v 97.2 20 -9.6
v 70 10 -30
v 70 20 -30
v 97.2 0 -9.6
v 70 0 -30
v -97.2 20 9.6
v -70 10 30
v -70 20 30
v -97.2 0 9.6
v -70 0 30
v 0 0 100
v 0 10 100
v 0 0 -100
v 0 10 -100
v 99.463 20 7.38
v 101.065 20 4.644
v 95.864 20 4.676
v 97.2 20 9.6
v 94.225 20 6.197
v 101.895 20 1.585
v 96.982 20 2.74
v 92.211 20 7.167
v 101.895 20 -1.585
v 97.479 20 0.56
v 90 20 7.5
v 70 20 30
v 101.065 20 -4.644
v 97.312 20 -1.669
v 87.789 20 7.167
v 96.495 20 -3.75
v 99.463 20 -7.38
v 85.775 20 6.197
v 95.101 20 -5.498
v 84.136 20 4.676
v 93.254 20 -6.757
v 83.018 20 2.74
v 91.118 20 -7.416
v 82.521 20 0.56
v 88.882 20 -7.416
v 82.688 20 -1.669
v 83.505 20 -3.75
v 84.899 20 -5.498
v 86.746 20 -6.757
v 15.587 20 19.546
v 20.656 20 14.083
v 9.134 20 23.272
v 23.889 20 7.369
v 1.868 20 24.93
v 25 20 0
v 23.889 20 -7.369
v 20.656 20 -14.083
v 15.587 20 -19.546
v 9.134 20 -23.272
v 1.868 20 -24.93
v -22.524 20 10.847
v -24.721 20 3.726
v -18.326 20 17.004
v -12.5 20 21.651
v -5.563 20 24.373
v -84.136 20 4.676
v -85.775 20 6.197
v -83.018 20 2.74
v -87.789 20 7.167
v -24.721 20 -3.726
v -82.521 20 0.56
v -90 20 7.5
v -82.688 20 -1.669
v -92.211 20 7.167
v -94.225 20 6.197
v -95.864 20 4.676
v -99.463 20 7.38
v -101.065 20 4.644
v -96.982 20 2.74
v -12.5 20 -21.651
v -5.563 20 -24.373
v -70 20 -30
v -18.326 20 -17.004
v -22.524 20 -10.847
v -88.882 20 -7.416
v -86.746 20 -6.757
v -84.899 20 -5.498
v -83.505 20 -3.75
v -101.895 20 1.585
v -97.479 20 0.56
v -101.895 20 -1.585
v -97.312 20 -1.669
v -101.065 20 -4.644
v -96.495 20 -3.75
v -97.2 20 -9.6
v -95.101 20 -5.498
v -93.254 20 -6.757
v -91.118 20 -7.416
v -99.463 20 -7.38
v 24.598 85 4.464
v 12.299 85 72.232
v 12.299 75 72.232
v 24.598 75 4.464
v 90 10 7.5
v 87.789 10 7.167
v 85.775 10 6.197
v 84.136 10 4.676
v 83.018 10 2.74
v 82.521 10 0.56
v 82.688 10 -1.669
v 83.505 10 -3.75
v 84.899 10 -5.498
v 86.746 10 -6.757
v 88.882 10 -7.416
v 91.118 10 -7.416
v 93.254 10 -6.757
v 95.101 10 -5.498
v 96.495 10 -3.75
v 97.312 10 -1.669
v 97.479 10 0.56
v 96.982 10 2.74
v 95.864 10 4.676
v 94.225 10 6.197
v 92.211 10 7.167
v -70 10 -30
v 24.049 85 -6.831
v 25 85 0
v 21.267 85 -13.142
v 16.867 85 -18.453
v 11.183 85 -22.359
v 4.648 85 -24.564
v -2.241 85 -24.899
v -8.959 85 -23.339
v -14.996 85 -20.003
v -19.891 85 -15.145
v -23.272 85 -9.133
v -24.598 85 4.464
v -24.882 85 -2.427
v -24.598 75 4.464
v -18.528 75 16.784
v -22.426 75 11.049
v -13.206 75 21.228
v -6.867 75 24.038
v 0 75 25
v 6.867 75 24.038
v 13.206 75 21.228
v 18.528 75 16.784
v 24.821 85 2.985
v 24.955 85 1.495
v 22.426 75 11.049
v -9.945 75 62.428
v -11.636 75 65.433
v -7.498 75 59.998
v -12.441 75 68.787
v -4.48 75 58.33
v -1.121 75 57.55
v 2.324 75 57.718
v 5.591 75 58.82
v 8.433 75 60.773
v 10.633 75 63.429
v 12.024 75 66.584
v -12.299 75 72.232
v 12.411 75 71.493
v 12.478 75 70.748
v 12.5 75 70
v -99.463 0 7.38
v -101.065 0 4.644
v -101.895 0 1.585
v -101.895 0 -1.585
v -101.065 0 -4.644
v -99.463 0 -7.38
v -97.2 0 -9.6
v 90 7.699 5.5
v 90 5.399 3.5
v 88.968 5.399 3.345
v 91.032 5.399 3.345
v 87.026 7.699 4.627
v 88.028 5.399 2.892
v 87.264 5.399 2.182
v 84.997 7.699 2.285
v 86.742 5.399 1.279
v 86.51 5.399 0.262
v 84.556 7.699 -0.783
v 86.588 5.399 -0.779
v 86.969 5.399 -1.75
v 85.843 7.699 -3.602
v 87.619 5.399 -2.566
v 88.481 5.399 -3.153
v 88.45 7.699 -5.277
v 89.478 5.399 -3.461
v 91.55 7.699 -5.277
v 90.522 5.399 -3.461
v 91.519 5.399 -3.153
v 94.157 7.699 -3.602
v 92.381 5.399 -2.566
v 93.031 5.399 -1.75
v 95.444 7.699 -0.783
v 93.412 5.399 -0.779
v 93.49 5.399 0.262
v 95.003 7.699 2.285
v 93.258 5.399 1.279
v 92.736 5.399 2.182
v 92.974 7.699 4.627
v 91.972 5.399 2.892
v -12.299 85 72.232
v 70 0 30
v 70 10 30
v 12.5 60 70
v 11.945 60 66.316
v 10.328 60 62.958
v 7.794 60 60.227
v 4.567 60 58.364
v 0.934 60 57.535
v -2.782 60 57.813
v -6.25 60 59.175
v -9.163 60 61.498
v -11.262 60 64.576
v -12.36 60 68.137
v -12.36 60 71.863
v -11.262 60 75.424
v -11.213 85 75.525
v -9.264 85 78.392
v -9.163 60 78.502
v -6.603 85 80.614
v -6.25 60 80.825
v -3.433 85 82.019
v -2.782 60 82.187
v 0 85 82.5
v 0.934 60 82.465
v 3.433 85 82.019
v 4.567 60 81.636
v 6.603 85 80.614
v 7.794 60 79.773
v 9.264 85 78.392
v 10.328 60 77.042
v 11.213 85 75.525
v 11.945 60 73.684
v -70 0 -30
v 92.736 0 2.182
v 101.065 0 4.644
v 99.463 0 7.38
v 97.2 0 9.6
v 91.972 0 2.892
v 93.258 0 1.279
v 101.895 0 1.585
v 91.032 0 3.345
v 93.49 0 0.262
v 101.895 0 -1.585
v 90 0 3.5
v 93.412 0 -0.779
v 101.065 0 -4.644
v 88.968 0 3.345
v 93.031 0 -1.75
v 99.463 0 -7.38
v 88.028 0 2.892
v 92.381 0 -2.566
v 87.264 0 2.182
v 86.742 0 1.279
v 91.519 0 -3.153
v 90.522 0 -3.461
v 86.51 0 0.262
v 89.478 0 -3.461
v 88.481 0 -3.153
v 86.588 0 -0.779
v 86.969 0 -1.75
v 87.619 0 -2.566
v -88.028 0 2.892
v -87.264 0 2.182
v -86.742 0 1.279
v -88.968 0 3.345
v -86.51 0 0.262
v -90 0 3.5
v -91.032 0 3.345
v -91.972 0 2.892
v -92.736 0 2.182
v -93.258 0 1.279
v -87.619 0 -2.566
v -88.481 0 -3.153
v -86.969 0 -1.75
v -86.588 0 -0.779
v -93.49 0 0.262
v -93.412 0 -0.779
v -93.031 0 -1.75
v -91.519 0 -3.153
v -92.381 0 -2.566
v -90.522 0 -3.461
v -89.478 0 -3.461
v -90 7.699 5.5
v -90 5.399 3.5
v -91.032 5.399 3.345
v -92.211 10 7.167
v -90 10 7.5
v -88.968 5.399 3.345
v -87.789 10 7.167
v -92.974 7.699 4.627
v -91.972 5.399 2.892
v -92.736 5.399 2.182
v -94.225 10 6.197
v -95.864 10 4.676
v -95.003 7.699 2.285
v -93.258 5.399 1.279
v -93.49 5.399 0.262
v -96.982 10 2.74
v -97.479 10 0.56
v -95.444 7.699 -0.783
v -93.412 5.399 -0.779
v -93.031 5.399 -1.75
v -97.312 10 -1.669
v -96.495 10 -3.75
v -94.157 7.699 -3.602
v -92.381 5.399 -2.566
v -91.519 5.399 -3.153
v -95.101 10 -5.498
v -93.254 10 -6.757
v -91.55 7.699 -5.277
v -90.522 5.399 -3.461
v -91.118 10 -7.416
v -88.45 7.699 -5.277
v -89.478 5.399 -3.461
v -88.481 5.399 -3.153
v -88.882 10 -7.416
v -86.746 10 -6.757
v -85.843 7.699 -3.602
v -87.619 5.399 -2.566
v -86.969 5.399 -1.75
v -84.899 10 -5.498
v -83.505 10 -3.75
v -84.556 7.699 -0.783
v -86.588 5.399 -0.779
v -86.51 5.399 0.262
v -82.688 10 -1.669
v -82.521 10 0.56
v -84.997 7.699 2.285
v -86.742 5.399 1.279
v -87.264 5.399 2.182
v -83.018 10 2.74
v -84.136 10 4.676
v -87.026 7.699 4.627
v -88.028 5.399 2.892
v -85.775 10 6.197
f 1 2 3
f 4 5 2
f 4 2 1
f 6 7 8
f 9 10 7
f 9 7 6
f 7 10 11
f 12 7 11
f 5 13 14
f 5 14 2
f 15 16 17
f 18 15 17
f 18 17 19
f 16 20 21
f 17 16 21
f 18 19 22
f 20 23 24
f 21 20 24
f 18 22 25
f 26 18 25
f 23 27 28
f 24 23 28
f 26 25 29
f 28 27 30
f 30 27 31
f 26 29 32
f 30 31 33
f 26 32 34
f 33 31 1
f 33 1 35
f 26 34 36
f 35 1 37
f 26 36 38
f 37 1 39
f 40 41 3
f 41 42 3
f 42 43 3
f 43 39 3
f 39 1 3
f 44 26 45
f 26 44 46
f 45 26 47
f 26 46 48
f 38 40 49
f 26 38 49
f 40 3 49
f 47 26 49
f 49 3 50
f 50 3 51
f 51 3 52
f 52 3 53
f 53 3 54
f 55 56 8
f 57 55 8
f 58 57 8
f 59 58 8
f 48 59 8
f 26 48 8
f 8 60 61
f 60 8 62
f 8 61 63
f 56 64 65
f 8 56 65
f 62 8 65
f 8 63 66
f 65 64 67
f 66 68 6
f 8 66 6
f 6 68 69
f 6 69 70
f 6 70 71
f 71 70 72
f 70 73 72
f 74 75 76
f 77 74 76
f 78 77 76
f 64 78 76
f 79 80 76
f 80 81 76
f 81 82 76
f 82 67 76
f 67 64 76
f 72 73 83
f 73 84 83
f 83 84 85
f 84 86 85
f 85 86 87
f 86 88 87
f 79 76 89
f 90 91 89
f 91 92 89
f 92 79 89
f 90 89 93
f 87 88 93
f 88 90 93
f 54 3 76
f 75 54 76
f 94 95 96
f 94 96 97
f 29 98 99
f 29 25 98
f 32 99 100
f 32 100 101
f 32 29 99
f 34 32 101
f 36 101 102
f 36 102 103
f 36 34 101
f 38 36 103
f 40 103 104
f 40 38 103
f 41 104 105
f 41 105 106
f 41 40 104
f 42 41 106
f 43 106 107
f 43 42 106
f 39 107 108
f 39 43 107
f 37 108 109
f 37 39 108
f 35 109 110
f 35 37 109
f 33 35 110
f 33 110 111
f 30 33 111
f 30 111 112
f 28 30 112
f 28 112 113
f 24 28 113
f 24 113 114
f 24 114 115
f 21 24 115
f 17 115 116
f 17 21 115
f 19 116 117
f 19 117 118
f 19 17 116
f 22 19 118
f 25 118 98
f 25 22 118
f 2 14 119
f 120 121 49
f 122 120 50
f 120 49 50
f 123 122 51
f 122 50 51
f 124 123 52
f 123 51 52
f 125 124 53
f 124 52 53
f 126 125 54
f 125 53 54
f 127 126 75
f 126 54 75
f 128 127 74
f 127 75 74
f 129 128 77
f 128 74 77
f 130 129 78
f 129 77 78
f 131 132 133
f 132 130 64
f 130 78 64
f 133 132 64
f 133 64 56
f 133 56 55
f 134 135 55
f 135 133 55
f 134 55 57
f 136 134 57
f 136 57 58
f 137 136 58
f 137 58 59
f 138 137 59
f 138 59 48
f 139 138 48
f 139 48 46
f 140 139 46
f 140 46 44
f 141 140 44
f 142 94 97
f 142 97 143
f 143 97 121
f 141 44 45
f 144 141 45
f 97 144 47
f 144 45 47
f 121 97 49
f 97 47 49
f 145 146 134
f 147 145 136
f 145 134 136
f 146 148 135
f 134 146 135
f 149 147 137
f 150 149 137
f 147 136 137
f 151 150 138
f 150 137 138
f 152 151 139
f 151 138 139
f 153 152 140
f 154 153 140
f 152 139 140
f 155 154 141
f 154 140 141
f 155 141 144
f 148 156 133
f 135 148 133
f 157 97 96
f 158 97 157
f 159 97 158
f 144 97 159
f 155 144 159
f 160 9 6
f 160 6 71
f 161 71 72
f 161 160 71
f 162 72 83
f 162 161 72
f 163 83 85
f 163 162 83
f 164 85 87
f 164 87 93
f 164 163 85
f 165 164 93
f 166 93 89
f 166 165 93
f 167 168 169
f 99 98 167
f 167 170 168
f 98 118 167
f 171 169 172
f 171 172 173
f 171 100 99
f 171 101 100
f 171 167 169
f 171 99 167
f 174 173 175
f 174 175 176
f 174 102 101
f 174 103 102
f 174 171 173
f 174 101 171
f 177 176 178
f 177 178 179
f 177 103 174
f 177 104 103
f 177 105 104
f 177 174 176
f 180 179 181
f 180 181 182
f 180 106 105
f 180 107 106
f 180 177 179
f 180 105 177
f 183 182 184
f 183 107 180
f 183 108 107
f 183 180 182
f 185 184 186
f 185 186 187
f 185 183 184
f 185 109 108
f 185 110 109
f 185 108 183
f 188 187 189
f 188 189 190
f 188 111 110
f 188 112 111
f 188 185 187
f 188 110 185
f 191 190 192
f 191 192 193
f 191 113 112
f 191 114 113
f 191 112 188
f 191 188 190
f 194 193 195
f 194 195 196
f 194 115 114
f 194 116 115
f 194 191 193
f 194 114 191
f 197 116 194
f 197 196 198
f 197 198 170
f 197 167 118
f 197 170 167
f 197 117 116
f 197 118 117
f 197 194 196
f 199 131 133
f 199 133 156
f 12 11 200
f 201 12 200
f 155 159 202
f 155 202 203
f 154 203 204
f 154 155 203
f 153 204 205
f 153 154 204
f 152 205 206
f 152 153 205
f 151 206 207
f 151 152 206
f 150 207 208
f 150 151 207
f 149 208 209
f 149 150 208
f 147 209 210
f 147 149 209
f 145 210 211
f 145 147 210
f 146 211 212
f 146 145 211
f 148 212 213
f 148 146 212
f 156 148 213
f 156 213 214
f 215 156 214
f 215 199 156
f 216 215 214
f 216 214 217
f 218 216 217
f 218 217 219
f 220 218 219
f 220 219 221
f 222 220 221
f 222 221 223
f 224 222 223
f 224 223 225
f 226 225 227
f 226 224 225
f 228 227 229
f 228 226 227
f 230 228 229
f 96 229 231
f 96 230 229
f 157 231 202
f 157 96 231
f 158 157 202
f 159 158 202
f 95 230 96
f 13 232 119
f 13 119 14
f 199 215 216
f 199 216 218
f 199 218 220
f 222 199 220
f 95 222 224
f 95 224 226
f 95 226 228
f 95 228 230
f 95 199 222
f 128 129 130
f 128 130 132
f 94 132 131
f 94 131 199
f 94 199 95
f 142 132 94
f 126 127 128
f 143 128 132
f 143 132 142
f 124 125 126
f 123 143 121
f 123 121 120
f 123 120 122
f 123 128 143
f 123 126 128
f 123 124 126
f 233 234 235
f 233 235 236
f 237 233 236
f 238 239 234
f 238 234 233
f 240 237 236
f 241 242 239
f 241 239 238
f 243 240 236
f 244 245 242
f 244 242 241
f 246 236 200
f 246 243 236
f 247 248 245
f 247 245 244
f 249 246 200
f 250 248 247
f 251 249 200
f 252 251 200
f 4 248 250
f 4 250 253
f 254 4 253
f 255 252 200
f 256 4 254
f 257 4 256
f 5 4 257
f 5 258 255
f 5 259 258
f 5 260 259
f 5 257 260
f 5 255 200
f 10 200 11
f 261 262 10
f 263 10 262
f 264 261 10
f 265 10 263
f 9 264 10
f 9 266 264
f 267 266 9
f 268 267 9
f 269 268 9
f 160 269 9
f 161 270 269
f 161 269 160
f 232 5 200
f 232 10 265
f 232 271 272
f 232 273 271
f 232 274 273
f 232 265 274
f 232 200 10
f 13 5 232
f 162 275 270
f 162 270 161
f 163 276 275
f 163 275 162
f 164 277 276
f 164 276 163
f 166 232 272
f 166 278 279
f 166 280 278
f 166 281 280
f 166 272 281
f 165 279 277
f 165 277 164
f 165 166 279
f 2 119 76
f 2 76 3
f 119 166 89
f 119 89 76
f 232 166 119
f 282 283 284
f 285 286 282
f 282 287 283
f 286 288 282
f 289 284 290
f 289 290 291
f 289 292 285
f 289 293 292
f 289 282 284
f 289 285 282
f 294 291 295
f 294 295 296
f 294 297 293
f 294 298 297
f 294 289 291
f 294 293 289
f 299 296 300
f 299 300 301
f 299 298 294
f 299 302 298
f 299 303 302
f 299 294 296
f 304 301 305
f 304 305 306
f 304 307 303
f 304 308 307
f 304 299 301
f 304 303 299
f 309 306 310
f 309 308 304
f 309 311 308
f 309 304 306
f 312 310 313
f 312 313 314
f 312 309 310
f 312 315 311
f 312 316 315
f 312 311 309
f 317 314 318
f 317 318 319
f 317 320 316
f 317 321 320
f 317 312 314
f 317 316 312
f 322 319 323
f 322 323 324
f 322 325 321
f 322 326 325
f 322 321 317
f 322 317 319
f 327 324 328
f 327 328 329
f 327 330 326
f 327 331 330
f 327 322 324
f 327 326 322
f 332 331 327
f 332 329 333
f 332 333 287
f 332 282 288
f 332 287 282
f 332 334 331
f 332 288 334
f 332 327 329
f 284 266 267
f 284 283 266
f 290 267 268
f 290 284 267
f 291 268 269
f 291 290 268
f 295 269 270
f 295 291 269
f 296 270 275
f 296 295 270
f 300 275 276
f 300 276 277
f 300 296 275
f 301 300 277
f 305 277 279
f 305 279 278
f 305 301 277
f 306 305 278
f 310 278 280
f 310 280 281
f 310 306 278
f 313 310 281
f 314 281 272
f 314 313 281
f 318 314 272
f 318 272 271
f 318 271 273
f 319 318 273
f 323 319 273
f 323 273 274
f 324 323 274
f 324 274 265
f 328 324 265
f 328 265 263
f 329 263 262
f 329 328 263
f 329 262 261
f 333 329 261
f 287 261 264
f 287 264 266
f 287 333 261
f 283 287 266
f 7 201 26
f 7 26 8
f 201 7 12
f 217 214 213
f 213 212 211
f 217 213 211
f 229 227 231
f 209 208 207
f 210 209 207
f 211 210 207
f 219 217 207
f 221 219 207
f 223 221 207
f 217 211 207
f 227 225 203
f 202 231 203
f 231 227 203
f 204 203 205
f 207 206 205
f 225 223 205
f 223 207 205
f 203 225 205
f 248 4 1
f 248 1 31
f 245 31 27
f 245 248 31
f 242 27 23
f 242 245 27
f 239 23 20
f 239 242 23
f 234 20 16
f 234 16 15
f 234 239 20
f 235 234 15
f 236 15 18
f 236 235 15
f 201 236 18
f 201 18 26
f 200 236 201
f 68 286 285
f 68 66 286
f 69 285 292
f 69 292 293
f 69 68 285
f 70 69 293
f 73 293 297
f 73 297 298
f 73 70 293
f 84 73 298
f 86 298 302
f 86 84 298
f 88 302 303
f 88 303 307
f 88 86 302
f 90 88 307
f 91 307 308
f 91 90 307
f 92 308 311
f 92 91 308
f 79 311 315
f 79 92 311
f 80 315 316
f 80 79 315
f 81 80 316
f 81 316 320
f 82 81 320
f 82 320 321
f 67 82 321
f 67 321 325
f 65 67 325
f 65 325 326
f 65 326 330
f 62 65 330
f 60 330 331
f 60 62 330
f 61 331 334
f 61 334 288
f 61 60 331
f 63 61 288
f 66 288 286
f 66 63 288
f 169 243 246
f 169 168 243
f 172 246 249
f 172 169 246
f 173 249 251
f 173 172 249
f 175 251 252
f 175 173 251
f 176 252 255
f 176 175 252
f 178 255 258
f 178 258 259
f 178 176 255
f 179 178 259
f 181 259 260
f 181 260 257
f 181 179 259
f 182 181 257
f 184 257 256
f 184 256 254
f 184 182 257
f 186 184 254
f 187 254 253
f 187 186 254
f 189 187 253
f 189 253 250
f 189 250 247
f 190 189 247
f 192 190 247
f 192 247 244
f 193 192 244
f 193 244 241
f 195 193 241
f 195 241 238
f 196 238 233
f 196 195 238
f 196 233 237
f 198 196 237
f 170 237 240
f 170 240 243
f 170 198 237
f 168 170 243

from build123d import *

# Parameters (mm, degrees)
SALIENTE_EXTRUIR1_DEPTH                     = 10
SALIENTE_EXTRUIR1_2_DEPTH                   = 10
CROQUIS2_3_R                                = 25
SALIENTE_EXTRUIR2_DEPTH                     = 20
CROQUIS2_4_R                                = 25
SALIENTE_EXTRUIR3_DEPTH                     = 85
SALIENTE_EXTRUIR4_START                     = -10
SALIENTE_EXTRUIR4_DEPTH                     = 10
SALIENTE_EXTRUIR5_START                     = -25
SALIENTE_EXTRUIR5_DEPTH                     = 25
AVELLANADO_PARA_TORNILLO_CON_CABEZA_2_COUNT = 2
AVELLANADO_PARA_TORNILLO_CON_CABEZA_2_PITCH = 180


with BuildPart() as part:
    # Croquis2 → Saliente-Extruir1 (new body)
    with BuildSketch(Plane(origin=(0, 0, 0), x_dir=(1, 0, 0), z_dir=(0, 1, 0))):
        Polygon((0, 100), (-70, 30), (70, 30), align=None)
    extrude(amount=SALIENTE_EXTRUIR1_DEPTH)



with BuildPart() as body_2:
    # Croquis2 → Saliente-Extruir1 2 (new body)
    with BuildSketch(Plane(origin=(0, 0, 0), x_dir=(1, 0, 0), z_dir=(0, 1, 0))):
        Polygon((70, -30), (-70, -30), (0, -100), align=None)
    extrude(amount=SALIENTE_EXTRUIR1_2_DEPTH)


with BuildPart() as part_1:
    add(part.part)

    add(body_2.part)  # Saliente-Extruir2 merges body 2
    # Croquis2<3> → Saliente-Extruir2 (add)
    with BuildSketch(Plane(origin=(0, 0, 0), x_dir=(1, 0, 0), z_dir=(0, 1, 0))):
        with BuildLine():
            Line((-70, 30), (-97.2, 9.6))
            ThreePointArc((-97.2, 9.6), (-102, 0), (-97.2, -9.6))
            Line((-97.2, -9.6), (-70, -30))
            Line((-70, -30), (70, -30))
            Line((70, -30), (97.2, -9.6))
            ThreePointArc((97.2, -9.6), (102, 0), (97.2, 9.6))
            Line((97.2, 9.6), (70, 30))
            Line((70, 30), (-70, 30))
        make_face()
        Circle(CROQUIS2_3_R, mode=Mode.SUBTRACT)
    extrude(amount=SALIENTE_EXTRUIR2_DEPTH)

    # Croquis2<4> → Saliente-Extruir3 (add)
    with BuildSketch(Plane(origin=(0, 0, 0), x_dir=(1, 0, 0), z_dir=(0, 1, 0))):
        Circle(CROQUIS2_4_R)
    extrude(amount=SALIENTE_EXTRUIR3_DEPTH)

    # Croquis3 → Saliente-Extruir4 (add)
    with BuildSketch(Plane(origin=(0, 85, 0), x_dir=(1, 0, 0), z_dir=(0, 1, 0)).offset(SALIENTE_EXTRUIR4_START)):
        with BuildLine():
            ThreePointArc((24.598173775, -4.464285714), (0, -25), (-24.598173775, -4.464285714))
            Line((-24.598173775, -4.464285714), (-12.299086887, -72.232142857))
            ThreePointArc((-12.299086887, -72.232142857), (-1.120583309, -57.550329601), (12.5, -70))
            ThreePointArc((12.5, -70), (12.449670399, -71.120583309), (12.299086887, -72.232142857))
            Line((12.299086887, -72.232142857), (24.598173775, -4.464285714))
        make_face()
    extrude(amount=SALIENTE_EXTRUIR4_DEPTH)

    # Croquis3<3> → Saliente-Extruir5 (add)
    with BuildSketch(Plane(origin=(0, 85, 0), x_dir=(1, 0, 0), z_dir=(0, 1, 0)).offset(SALIENTE_EXTRUIR5_START)):
        with BuildLine():
            ThreePointArc((12.299086887, -72.232142857), (12.449670399, -71.120583309), (12.5, -70))
            ThreePointArc((12.5, -70), (-1.120583309, -57.550329601), (-12.299086887, -72.232142857))
            ThreePointArc((-12.299086887, -72.232142857), (0, -82.5), (12.299086887, -72.232142857))
        make_face()
    extrude(amount=SALIENTE_EXTRUIR5_DEPTH)

    # Croquis6 → Avellanado para tornillo con cabeza ovalada de #01 (revolve, cut)
    with BuildSketch(Plane(origin=(90, 20, 0), x_dir=(0, 0, 1), z_dir=(1, 0, 0))):
        Polygon((0, 0), (0, 20), (3.499999985, 20), (3.499999985, 14.60147363), (7.499999986, 10), (7.499999986, 0), align=None)
    avellanado_para_tornillo_con_cabeza_oval = revolve(axis=Axis((90, 26.35, 0), (0, -1, 0)), mode=Mode.SUBTRACT)

    # Avellanado para tornillo con cabeza  2: Avellanado para tornillo con cabeza ovalada de #01 ×2
    with Locations(*[(-i * AVELLANADO_PARA_TORNILLO_CON_CABEZA_2_PITCH, 0, 0) for i in range(1, AVELLANADO_PARA_TORNILLO_CON_CABEZA_2_COUNT)]):
        add(avellanado_para_tornillo_con_cabeza_oval, mode=Mode.SUBTRACT)


solid = part_1.part
